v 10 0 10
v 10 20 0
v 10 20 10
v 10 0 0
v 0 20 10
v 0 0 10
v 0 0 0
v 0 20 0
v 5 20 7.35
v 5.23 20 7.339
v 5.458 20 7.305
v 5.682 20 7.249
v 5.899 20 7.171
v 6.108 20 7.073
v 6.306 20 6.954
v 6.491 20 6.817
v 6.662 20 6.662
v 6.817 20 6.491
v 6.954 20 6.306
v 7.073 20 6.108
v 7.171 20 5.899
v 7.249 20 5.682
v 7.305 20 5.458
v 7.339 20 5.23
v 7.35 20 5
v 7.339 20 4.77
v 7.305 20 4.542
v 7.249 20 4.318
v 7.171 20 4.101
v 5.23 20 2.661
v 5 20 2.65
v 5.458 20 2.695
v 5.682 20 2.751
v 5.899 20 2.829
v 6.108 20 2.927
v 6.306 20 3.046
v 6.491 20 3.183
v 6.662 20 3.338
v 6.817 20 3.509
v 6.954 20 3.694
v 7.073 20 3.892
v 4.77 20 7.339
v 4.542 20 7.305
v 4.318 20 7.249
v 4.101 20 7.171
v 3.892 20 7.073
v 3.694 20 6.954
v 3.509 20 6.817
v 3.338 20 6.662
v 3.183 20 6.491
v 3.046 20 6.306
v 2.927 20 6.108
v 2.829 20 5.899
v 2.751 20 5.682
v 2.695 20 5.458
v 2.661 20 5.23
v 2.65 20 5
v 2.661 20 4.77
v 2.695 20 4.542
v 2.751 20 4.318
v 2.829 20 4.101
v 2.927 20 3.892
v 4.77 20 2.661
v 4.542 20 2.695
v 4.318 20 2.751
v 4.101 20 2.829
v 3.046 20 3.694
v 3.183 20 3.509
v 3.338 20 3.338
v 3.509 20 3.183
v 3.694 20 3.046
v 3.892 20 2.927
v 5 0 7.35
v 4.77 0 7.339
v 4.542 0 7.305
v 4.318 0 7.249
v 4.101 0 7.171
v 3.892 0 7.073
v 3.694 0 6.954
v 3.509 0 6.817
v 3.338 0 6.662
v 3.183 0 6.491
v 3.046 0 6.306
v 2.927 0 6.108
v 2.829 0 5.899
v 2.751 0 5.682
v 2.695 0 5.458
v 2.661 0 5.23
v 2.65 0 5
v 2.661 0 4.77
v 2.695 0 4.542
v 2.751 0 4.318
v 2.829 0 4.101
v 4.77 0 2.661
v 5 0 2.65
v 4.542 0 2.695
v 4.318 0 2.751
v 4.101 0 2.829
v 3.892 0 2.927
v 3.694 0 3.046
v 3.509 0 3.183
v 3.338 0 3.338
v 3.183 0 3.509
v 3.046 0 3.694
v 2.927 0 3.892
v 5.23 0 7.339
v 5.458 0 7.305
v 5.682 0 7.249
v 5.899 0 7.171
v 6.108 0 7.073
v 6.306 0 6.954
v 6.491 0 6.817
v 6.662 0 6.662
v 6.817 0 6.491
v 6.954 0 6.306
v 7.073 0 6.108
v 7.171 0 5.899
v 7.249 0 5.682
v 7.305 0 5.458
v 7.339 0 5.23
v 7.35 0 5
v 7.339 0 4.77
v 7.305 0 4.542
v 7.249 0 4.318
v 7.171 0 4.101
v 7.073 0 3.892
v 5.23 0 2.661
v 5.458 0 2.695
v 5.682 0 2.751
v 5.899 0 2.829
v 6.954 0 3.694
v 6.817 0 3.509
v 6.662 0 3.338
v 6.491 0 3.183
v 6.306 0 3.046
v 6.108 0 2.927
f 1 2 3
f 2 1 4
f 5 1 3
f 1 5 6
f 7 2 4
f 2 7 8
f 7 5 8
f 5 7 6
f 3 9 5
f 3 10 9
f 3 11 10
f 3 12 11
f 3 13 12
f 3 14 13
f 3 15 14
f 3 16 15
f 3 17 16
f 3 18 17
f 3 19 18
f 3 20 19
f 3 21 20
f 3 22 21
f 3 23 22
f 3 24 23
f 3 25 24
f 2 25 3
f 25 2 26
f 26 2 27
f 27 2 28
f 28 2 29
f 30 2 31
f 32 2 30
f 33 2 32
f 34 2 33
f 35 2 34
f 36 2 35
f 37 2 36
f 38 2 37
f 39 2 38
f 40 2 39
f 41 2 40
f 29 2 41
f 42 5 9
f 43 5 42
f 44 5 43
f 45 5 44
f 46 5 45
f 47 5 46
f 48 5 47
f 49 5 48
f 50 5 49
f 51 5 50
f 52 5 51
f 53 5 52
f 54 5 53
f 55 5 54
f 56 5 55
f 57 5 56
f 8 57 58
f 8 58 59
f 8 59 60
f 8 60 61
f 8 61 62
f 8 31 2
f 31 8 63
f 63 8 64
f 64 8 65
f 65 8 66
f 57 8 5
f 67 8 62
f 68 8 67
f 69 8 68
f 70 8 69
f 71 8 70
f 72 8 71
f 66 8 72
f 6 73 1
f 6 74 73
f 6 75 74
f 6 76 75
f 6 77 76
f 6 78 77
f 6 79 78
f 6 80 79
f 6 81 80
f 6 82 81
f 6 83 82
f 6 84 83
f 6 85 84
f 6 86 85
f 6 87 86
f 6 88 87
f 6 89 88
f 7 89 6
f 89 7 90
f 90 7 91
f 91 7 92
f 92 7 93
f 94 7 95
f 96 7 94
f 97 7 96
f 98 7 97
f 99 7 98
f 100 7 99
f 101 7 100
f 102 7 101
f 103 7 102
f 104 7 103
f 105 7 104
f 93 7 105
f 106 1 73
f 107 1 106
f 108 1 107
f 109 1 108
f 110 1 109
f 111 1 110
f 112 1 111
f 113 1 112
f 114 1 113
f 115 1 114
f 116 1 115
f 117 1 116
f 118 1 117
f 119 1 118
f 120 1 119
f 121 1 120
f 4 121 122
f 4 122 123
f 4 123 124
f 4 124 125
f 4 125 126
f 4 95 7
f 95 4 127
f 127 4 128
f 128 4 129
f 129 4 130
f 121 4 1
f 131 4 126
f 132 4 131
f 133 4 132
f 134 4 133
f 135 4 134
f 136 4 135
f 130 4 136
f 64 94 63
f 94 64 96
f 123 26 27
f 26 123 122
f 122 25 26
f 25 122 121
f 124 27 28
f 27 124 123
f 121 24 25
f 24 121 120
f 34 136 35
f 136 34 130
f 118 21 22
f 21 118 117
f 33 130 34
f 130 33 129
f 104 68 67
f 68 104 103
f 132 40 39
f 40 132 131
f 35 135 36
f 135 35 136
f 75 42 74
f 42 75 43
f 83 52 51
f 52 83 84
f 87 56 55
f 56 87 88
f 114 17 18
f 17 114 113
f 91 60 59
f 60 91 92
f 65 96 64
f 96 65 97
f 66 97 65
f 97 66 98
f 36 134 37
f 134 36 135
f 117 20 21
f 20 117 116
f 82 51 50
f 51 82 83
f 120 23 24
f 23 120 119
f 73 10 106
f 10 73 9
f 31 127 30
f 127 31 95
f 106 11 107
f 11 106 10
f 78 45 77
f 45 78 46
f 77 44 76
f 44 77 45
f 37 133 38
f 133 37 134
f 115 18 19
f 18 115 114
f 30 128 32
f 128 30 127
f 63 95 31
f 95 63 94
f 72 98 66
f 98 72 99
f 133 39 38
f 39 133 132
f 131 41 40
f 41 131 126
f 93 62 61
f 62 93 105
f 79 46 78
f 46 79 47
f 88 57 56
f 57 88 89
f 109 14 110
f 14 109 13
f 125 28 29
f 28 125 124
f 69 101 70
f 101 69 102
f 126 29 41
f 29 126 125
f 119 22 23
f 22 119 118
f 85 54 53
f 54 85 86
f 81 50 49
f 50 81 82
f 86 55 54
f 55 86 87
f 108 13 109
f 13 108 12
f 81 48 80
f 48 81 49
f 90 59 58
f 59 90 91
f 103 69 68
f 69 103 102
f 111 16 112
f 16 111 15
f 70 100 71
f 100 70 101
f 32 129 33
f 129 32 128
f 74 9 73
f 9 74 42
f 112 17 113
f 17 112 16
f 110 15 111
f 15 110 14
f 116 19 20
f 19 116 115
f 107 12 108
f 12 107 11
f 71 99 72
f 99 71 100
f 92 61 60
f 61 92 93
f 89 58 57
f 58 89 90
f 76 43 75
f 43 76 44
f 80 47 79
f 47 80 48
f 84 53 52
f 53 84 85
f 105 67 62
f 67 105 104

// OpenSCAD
$fn = 64;

difference() {
    cube([10, 20, 10]);
    
    translate([5, -1, 5])
        rotate([-90, 0, 0])
            cylinder(h=22, d=4.7);
}
